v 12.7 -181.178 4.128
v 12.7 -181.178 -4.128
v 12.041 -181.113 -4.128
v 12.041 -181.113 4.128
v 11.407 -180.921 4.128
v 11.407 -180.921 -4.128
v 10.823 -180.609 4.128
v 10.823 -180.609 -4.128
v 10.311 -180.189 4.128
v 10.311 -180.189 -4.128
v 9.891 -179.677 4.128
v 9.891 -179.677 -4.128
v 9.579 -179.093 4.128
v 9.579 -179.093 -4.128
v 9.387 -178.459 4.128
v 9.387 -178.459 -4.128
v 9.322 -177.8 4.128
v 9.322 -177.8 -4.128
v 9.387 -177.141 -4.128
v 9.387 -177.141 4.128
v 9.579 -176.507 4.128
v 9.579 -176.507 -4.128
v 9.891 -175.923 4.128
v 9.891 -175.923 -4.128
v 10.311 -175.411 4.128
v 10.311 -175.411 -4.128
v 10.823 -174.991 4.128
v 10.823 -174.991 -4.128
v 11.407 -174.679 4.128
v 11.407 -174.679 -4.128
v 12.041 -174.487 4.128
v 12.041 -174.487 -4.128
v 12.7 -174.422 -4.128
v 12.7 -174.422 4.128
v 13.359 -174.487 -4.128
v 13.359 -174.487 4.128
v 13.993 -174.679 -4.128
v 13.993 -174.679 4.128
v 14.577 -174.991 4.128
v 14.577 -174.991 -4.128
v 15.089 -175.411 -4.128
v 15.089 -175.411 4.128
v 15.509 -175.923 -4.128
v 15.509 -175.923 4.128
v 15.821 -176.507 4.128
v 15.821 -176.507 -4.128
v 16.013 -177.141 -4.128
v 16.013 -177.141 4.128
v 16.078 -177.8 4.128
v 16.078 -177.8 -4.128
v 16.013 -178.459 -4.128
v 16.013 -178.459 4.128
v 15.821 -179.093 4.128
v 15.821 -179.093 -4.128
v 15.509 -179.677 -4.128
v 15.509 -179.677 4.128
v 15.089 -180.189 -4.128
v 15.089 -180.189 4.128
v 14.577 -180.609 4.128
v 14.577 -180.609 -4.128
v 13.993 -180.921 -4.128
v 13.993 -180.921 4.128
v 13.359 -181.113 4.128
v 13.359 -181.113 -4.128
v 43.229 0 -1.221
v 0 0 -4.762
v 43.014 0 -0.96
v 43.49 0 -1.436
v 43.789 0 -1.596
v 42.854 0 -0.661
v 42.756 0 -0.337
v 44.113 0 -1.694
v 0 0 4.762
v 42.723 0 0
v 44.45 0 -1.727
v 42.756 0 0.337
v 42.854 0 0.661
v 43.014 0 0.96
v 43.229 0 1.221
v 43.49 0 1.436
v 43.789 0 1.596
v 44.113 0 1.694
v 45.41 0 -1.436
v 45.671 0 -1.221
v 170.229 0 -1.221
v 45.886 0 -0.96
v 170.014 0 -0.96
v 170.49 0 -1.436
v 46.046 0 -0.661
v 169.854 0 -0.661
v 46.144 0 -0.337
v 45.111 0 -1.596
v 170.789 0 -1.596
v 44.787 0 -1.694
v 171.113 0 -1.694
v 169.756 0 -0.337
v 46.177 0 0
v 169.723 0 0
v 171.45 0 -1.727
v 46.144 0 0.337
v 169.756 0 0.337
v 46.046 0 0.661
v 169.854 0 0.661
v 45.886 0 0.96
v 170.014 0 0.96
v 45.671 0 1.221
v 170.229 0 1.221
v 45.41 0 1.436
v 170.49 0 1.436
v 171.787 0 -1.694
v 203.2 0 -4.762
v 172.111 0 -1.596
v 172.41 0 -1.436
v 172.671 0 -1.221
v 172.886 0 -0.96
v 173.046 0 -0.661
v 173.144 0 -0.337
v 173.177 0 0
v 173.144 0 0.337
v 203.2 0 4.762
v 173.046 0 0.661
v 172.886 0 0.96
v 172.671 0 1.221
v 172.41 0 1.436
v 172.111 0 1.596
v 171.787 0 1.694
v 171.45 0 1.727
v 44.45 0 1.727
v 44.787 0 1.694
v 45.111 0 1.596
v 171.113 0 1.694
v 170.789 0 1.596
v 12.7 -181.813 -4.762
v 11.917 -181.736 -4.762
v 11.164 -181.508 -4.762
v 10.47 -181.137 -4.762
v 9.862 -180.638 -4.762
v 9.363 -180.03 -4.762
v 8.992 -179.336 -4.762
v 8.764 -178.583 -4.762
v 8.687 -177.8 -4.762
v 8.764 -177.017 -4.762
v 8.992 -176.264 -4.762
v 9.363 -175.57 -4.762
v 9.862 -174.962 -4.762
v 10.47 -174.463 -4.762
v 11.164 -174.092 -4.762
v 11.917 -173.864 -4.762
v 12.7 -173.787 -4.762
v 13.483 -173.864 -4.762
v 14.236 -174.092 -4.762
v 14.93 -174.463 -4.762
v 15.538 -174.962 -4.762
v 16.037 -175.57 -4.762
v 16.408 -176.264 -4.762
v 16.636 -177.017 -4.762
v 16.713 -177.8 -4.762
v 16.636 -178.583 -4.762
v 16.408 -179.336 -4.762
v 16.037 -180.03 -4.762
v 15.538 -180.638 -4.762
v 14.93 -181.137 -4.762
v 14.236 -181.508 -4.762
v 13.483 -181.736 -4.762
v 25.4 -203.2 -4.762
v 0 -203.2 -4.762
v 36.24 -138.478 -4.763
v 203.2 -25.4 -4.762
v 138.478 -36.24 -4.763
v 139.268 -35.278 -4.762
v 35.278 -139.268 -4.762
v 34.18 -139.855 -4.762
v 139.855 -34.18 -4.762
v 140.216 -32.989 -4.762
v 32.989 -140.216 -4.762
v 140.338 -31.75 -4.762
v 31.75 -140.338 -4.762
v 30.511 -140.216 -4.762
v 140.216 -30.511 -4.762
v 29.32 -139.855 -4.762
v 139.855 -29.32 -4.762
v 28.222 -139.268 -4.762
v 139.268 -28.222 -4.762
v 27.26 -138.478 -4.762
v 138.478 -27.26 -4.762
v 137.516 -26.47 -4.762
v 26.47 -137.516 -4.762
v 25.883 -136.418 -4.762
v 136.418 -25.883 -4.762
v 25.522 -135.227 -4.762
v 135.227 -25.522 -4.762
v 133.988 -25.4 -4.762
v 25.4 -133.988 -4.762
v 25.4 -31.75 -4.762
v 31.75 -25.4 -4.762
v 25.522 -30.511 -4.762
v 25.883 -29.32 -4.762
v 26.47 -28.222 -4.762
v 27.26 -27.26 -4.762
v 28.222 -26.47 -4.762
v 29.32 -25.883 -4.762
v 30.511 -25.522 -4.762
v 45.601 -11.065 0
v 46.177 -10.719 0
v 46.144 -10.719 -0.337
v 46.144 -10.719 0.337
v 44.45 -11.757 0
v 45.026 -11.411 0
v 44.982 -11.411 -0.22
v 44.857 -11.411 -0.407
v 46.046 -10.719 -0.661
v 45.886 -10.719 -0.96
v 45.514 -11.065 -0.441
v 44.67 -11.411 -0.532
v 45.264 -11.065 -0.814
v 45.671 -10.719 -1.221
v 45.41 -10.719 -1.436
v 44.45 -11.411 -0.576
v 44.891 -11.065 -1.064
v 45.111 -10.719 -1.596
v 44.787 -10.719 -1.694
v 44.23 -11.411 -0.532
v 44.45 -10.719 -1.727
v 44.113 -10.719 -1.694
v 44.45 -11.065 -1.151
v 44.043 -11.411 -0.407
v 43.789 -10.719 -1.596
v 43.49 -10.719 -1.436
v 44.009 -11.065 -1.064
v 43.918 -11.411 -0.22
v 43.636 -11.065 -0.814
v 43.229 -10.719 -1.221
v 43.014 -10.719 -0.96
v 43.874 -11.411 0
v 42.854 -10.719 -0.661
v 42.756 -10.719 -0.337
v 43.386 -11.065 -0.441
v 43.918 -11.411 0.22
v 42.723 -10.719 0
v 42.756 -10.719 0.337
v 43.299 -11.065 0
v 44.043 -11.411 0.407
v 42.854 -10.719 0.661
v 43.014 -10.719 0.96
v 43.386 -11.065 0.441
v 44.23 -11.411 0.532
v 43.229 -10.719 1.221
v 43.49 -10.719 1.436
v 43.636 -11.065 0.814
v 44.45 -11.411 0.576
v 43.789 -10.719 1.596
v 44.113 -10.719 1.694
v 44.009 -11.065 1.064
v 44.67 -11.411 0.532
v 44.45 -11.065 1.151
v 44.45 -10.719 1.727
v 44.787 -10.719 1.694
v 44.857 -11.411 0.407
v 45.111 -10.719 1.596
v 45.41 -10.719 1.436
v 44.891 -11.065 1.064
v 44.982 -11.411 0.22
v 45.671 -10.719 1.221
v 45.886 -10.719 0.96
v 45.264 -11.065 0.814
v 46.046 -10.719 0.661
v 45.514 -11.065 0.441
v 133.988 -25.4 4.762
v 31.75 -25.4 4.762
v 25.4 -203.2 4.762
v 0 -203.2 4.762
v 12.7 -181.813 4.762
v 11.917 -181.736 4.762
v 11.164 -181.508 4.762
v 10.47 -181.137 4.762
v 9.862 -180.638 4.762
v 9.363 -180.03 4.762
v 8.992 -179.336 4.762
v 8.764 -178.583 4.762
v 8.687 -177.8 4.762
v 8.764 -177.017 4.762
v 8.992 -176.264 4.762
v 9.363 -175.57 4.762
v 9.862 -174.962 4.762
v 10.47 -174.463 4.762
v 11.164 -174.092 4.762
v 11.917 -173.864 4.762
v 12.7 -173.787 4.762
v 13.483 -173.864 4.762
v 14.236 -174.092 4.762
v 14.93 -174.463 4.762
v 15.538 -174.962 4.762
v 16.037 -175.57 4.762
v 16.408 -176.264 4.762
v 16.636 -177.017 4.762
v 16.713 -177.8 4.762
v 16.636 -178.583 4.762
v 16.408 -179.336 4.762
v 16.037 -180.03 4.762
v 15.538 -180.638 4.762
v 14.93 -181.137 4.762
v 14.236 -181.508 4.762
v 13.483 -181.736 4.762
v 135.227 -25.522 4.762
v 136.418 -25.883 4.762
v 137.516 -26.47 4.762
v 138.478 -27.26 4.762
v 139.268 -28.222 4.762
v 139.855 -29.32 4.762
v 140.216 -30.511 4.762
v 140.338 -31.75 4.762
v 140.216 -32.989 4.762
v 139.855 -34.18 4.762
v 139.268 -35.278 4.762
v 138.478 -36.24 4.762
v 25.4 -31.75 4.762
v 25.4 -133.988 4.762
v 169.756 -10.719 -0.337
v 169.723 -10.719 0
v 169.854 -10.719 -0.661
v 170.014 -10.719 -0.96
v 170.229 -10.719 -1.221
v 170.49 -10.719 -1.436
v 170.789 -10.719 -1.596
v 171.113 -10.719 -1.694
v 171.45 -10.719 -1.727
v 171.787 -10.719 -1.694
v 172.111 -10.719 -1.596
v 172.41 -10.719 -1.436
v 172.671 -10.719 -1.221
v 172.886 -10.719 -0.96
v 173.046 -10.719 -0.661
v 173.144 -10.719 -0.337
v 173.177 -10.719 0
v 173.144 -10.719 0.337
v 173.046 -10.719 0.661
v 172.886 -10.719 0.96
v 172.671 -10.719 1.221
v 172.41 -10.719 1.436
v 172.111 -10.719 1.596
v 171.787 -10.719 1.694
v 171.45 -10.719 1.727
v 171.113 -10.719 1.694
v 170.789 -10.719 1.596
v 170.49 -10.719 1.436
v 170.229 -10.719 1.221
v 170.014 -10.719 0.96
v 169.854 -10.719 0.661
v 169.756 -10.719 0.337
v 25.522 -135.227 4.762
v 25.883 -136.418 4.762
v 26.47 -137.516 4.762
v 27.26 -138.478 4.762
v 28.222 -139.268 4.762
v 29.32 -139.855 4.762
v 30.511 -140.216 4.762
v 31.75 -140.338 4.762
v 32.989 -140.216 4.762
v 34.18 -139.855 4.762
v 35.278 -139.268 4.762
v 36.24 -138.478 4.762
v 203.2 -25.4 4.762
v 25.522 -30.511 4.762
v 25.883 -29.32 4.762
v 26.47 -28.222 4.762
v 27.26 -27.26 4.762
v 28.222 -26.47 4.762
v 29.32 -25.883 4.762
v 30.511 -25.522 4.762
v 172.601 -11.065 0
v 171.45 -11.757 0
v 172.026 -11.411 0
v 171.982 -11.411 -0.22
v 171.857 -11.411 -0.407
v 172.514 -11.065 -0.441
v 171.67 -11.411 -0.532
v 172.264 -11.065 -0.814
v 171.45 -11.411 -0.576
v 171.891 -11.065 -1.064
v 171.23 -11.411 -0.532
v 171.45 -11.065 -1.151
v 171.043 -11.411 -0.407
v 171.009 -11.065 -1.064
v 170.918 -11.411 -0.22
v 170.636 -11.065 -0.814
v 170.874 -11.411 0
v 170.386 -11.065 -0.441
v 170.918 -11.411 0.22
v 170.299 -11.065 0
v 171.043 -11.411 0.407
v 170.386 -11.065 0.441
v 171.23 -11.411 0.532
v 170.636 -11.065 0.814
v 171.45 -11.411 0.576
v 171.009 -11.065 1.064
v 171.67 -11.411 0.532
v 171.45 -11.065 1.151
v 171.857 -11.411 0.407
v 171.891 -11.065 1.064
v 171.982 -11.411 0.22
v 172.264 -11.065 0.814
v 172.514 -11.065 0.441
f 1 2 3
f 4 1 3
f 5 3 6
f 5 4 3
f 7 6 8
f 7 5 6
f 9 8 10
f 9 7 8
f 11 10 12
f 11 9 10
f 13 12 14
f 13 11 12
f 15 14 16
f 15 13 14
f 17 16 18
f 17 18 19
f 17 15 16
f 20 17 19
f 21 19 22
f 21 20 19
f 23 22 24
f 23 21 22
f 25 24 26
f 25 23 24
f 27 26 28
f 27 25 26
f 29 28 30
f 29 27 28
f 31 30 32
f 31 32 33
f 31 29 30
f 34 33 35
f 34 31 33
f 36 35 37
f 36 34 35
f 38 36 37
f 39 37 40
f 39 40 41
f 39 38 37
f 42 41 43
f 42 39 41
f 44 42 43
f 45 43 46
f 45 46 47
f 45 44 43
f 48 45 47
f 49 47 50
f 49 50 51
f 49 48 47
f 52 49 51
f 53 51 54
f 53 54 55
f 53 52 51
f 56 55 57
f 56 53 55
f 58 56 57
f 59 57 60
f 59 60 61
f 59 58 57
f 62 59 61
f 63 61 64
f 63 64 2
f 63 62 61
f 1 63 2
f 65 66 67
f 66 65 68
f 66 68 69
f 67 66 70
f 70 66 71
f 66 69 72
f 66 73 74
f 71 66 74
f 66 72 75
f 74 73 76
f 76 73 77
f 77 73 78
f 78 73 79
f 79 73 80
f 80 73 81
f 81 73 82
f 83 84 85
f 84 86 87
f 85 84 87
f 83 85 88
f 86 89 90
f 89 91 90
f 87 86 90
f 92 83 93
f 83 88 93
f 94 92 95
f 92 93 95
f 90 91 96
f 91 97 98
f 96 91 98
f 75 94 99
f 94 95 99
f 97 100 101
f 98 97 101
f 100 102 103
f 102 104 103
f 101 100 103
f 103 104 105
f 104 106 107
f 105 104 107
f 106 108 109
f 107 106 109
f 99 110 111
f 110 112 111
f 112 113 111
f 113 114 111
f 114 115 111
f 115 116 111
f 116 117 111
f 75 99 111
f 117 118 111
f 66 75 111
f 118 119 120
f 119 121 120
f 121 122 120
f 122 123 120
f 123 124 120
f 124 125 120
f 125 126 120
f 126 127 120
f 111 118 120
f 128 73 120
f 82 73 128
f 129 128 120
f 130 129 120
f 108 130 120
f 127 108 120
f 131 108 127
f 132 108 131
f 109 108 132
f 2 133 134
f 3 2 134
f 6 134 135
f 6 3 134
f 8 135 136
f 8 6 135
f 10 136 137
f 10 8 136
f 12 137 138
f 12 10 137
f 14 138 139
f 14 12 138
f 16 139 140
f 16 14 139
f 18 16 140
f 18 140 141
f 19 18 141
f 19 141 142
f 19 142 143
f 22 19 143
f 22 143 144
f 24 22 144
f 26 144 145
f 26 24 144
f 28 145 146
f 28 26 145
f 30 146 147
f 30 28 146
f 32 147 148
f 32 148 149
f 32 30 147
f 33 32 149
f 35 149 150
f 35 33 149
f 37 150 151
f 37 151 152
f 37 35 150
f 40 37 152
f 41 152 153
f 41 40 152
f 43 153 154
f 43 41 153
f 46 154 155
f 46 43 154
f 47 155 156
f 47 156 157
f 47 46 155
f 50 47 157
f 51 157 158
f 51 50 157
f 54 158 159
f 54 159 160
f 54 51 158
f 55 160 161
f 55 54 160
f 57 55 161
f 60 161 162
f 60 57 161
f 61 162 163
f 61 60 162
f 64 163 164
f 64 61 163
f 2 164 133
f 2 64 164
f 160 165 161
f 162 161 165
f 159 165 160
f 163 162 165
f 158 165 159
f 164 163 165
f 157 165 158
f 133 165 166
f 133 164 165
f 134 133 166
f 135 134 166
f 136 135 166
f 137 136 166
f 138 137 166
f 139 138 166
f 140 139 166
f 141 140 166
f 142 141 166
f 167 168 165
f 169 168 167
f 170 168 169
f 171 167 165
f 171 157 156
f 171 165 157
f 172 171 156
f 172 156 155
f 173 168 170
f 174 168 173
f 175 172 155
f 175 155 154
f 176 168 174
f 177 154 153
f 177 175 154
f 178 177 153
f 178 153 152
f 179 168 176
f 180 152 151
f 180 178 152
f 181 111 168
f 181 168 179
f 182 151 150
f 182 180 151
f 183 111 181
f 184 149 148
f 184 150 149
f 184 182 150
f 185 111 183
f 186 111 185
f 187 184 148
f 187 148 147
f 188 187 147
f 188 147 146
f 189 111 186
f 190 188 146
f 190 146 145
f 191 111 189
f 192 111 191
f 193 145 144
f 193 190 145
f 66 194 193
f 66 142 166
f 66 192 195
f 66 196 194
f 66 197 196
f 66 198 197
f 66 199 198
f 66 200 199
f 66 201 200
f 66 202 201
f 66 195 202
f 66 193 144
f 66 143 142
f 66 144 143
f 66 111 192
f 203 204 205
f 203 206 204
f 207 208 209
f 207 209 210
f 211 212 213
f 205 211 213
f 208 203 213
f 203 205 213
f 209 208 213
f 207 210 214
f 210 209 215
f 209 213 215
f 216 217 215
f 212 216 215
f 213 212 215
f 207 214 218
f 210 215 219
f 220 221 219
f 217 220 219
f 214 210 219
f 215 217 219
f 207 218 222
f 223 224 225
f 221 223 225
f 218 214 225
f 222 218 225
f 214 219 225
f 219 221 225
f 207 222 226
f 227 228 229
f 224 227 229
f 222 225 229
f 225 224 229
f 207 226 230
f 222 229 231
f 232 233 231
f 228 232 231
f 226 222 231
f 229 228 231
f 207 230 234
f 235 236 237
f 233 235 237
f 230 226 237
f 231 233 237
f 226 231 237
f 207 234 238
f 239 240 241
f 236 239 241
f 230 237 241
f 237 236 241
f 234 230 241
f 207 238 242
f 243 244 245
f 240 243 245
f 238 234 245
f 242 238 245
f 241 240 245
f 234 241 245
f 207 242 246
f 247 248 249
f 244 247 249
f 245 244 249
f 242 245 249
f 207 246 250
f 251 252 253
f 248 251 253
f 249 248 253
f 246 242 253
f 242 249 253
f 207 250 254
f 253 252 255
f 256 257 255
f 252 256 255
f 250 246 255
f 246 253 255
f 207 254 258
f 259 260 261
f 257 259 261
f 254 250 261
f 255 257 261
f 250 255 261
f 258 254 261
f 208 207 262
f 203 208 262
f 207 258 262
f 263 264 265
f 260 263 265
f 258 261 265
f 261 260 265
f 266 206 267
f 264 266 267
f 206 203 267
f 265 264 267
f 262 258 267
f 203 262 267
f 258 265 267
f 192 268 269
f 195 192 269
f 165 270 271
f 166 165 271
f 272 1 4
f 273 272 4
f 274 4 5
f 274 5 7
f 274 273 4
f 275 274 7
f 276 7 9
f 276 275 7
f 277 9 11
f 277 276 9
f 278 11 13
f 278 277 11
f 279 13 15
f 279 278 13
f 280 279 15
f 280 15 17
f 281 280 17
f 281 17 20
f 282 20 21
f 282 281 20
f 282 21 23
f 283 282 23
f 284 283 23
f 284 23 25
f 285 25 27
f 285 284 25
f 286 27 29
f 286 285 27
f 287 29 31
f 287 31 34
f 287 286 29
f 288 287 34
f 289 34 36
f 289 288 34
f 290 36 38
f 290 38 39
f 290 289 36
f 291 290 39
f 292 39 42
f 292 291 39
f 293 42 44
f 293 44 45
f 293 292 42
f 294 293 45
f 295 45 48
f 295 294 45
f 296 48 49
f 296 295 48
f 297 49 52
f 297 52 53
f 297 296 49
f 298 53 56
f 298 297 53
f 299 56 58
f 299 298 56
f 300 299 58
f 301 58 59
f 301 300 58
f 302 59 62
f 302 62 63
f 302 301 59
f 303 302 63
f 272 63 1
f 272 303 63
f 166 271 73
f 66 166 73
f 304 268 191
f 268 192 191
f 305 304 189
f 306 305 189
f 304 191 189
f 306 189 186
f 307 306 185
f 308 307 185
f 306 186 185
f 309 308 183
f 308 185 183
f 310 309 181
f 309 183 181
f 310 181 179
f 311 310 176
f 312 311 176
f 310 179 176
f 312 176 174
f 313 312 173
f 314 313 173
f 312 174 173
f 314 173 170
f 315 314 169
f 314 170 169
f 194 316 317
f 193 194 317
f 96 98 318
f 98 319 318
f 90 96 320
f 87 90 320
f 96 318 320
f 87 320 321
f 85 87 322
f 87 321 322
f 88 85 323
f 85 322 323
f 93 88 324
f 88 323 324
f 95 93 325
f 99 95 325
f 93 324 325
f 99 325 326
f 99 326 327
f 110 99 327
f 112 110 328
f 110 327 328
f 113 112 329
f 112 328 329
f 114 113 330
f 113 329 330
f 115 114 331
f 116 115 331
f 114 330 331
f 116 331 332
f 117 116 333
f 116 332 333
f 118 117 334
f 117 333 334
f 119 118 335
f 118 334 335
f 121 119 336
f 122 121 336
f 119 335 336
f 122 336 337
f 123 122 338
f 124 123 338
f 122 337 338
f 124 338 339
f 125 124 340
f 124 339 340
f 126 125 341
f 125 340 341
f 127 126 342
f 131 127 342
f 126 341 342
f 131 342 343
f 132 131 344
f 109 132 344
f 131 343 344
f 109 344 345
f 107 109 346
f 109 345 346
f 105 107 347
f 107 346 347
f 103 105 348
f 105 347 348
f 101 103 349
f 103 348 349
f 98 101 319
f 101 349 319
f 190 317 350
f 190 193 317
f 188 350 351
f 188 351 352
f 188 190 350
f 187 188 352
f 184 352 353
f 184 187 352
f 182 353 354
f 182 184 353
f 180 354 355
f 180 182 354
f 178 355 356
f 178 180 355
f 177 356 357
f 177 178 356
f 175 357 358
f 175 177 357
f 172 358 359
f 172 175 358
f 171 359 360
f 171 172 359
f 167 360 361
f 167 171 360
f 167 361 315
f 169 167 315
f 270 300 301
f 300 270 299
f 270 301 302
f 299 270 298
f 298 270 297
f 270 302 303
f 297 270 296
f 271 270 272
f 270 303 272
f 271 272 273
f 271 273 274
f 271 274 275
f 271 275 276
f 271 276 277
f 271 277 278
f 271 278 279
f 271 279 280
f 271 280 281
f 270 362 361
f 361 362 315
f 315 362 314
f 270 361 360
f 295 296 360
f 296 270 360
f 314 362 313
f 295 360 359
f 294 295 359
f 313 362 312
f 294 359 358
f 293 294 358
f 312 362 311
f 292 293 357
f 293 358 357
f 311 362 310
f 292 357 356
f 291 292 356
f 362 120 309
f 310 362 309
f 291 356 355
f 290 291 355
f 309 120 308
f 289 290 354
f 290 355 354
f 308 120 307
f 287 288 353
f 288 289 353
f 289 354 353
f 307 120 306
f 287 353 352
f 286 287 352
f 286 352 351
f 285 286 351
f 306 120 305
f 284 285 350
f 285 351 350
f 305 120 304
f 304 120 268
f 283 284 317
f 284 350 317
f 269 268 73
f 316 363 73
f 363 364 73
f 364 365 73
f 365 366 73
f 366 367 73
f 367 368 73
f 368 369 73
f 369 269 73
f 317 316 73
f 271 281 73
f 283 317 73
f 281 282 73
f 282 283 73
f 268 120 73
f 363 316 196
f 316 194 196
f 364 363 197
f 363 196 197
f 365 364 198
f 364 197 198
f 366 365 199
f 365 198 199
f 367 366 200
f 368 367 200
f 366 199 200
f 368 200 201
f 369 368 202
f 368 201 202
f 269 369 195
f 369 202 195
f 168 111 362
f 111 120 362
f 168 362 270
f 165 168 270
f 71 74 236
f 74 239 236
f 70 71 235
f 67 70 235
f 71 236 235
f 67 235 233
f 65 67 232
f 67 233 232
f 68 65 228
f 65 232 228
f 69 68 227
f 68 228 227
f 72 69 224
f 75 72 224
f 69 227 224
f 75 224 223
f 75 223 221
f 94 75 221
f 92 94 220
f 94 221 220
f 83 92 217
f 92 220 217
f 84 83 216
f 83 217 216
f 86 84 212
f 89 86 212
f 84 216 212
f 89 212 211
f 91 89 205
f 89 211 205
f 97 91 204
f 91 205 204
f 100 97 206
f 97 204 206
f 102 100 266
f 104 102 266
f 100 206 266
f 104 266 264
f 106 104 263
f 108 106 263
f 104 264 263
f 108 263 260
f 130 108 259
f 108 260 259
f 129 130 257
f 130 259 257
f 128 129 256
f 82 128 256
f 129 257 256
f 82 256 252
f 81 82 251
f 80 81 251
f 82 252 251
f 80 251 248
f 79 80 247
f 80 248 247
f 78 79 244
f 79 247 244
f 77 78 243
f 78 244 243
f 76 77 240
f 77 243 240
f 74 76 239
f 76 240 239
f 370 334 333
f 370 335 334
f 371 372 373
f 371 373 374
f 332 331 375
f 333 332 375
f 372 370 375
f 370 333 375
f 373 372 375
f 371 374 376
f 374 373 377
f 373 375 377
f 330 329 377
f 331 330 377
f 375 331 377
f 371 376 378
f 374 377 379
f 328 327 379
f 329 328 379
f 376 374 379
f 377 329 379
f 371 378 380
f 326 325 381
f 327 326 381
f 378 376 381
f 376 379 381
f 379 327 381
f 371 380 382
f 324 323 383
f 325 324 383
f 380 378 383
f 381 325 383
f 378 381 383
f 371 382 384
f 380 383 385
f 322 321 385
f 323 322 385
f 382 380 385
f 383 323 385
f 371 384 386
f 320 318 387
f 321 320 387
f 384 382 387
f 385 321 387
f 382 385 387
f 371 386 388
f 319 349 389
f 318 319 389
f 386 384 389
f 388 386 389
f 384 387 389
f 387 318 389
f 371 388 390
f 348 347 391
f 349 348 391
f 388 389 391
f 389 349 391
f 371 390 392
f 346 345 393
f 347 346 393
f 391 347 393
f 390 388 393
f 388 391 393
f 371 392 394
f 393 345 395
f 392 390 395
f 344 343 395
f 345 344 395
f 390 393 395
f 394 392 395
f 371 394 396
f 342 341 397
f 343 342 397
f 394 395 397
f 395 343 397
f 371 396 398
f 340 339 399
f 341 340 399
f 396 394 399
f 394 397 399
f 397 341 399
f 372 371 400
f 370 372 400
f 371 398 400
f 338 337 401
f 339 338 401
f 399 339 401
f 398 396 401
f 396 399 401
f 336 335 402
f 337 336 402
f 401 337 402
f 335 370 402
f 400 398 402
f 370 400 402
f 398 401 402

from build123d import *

# Parameters (mm, degrees)
BOSS_EXTRUDE1_DEPTH       = 4.7625
F_8_32_TAPPED_HOLE1_D     = 3.4544
F_8_32_TAPPED_HOLE1_DEPTH = 10.7188
F_8_32_TAPPED_HOLE1_TIP   = 1.037806461
CUT_EXTRUDE1_DEPTH        = 288.526008606
FILLET1_R                 = 6.35


with BuildPart() as part:
    # Sketch1 → Boss-Extrude1 (new, symmetric)
    with BuildSketch(Plane.XY):
        Polygon((0, -203.2), (0, 0), (203.2, 0), (203.2, -25.4), (25.4, -203.2), align=None)
    extrude(amount=BOSS_EXTRUDE1_DEPTH, both=True)

    # 8-32 Tapped Hole1
    with Locations(Plane(origin=(0, 0, 0), x_dir=(1, 0, 0), z_dir=(0, 1, 0))):
        with Locations((44.45, 0), (171.45, 0)):
            Hole(F_8_32_TAPPED_HOLE1_D / 2, depth=F_8_32_TAPPED_HOLE1_DEPTH)
            with Locations((0, 0, -(F_8_32_TAPPED_HOLE1_DEPTH + F_8_32_TAPPED_HOLE1_TIP / 2))):  # 118° drill point
                Cone(0, F_8_32_TAPPED_HOLE1_D / 2, F_8_32_TAPPED_HOLE1_TIP, mode=Mode.SUBTRACT)

    # Sketch6 → 1_4 Clearance Hole1 (revolve, cut)
    with BuildSketch(Plane(origin=(12.7, -177.8, 4.7625), x_dir=(0, -1, 0), z_dir=(1, 0, 0))):
        Polygon((0, 0), (0, 9.525), (4.0132, 9.525), (3.3782, 8.89), (3.3782, 0.635), (4.0132, 0), align=None)
    revolve(axis=Axis((12.7, -177.8, 11.1125), (0, 0, -1)), mode=Mode.SUBTRACT)

    # Sketch7 → Cut-Extrude1 (cut, through all)
    with BuildSketch(Plane.XY.offset(4.7625)):
        Polygon((25.4, -25.4), (25.4, -149.318463274), (149.318463274, -25.4), align=None)
    extrude(amount=-CUT_EXTRUDE1_DEPTH, mode=Mode.SUBTRACT)

    # Fillet1
    fillet1_edges = [part.edges().sort_by_distance(p)[0] for p in [
        (25.4, -25.4, 0),
        (149.318463274, -25.4, 0),
        (25.4, -149.318463274, 0),
    ]]
    fillet(fillet1_edges, radius=FILLET1_R)


solid = part.part
